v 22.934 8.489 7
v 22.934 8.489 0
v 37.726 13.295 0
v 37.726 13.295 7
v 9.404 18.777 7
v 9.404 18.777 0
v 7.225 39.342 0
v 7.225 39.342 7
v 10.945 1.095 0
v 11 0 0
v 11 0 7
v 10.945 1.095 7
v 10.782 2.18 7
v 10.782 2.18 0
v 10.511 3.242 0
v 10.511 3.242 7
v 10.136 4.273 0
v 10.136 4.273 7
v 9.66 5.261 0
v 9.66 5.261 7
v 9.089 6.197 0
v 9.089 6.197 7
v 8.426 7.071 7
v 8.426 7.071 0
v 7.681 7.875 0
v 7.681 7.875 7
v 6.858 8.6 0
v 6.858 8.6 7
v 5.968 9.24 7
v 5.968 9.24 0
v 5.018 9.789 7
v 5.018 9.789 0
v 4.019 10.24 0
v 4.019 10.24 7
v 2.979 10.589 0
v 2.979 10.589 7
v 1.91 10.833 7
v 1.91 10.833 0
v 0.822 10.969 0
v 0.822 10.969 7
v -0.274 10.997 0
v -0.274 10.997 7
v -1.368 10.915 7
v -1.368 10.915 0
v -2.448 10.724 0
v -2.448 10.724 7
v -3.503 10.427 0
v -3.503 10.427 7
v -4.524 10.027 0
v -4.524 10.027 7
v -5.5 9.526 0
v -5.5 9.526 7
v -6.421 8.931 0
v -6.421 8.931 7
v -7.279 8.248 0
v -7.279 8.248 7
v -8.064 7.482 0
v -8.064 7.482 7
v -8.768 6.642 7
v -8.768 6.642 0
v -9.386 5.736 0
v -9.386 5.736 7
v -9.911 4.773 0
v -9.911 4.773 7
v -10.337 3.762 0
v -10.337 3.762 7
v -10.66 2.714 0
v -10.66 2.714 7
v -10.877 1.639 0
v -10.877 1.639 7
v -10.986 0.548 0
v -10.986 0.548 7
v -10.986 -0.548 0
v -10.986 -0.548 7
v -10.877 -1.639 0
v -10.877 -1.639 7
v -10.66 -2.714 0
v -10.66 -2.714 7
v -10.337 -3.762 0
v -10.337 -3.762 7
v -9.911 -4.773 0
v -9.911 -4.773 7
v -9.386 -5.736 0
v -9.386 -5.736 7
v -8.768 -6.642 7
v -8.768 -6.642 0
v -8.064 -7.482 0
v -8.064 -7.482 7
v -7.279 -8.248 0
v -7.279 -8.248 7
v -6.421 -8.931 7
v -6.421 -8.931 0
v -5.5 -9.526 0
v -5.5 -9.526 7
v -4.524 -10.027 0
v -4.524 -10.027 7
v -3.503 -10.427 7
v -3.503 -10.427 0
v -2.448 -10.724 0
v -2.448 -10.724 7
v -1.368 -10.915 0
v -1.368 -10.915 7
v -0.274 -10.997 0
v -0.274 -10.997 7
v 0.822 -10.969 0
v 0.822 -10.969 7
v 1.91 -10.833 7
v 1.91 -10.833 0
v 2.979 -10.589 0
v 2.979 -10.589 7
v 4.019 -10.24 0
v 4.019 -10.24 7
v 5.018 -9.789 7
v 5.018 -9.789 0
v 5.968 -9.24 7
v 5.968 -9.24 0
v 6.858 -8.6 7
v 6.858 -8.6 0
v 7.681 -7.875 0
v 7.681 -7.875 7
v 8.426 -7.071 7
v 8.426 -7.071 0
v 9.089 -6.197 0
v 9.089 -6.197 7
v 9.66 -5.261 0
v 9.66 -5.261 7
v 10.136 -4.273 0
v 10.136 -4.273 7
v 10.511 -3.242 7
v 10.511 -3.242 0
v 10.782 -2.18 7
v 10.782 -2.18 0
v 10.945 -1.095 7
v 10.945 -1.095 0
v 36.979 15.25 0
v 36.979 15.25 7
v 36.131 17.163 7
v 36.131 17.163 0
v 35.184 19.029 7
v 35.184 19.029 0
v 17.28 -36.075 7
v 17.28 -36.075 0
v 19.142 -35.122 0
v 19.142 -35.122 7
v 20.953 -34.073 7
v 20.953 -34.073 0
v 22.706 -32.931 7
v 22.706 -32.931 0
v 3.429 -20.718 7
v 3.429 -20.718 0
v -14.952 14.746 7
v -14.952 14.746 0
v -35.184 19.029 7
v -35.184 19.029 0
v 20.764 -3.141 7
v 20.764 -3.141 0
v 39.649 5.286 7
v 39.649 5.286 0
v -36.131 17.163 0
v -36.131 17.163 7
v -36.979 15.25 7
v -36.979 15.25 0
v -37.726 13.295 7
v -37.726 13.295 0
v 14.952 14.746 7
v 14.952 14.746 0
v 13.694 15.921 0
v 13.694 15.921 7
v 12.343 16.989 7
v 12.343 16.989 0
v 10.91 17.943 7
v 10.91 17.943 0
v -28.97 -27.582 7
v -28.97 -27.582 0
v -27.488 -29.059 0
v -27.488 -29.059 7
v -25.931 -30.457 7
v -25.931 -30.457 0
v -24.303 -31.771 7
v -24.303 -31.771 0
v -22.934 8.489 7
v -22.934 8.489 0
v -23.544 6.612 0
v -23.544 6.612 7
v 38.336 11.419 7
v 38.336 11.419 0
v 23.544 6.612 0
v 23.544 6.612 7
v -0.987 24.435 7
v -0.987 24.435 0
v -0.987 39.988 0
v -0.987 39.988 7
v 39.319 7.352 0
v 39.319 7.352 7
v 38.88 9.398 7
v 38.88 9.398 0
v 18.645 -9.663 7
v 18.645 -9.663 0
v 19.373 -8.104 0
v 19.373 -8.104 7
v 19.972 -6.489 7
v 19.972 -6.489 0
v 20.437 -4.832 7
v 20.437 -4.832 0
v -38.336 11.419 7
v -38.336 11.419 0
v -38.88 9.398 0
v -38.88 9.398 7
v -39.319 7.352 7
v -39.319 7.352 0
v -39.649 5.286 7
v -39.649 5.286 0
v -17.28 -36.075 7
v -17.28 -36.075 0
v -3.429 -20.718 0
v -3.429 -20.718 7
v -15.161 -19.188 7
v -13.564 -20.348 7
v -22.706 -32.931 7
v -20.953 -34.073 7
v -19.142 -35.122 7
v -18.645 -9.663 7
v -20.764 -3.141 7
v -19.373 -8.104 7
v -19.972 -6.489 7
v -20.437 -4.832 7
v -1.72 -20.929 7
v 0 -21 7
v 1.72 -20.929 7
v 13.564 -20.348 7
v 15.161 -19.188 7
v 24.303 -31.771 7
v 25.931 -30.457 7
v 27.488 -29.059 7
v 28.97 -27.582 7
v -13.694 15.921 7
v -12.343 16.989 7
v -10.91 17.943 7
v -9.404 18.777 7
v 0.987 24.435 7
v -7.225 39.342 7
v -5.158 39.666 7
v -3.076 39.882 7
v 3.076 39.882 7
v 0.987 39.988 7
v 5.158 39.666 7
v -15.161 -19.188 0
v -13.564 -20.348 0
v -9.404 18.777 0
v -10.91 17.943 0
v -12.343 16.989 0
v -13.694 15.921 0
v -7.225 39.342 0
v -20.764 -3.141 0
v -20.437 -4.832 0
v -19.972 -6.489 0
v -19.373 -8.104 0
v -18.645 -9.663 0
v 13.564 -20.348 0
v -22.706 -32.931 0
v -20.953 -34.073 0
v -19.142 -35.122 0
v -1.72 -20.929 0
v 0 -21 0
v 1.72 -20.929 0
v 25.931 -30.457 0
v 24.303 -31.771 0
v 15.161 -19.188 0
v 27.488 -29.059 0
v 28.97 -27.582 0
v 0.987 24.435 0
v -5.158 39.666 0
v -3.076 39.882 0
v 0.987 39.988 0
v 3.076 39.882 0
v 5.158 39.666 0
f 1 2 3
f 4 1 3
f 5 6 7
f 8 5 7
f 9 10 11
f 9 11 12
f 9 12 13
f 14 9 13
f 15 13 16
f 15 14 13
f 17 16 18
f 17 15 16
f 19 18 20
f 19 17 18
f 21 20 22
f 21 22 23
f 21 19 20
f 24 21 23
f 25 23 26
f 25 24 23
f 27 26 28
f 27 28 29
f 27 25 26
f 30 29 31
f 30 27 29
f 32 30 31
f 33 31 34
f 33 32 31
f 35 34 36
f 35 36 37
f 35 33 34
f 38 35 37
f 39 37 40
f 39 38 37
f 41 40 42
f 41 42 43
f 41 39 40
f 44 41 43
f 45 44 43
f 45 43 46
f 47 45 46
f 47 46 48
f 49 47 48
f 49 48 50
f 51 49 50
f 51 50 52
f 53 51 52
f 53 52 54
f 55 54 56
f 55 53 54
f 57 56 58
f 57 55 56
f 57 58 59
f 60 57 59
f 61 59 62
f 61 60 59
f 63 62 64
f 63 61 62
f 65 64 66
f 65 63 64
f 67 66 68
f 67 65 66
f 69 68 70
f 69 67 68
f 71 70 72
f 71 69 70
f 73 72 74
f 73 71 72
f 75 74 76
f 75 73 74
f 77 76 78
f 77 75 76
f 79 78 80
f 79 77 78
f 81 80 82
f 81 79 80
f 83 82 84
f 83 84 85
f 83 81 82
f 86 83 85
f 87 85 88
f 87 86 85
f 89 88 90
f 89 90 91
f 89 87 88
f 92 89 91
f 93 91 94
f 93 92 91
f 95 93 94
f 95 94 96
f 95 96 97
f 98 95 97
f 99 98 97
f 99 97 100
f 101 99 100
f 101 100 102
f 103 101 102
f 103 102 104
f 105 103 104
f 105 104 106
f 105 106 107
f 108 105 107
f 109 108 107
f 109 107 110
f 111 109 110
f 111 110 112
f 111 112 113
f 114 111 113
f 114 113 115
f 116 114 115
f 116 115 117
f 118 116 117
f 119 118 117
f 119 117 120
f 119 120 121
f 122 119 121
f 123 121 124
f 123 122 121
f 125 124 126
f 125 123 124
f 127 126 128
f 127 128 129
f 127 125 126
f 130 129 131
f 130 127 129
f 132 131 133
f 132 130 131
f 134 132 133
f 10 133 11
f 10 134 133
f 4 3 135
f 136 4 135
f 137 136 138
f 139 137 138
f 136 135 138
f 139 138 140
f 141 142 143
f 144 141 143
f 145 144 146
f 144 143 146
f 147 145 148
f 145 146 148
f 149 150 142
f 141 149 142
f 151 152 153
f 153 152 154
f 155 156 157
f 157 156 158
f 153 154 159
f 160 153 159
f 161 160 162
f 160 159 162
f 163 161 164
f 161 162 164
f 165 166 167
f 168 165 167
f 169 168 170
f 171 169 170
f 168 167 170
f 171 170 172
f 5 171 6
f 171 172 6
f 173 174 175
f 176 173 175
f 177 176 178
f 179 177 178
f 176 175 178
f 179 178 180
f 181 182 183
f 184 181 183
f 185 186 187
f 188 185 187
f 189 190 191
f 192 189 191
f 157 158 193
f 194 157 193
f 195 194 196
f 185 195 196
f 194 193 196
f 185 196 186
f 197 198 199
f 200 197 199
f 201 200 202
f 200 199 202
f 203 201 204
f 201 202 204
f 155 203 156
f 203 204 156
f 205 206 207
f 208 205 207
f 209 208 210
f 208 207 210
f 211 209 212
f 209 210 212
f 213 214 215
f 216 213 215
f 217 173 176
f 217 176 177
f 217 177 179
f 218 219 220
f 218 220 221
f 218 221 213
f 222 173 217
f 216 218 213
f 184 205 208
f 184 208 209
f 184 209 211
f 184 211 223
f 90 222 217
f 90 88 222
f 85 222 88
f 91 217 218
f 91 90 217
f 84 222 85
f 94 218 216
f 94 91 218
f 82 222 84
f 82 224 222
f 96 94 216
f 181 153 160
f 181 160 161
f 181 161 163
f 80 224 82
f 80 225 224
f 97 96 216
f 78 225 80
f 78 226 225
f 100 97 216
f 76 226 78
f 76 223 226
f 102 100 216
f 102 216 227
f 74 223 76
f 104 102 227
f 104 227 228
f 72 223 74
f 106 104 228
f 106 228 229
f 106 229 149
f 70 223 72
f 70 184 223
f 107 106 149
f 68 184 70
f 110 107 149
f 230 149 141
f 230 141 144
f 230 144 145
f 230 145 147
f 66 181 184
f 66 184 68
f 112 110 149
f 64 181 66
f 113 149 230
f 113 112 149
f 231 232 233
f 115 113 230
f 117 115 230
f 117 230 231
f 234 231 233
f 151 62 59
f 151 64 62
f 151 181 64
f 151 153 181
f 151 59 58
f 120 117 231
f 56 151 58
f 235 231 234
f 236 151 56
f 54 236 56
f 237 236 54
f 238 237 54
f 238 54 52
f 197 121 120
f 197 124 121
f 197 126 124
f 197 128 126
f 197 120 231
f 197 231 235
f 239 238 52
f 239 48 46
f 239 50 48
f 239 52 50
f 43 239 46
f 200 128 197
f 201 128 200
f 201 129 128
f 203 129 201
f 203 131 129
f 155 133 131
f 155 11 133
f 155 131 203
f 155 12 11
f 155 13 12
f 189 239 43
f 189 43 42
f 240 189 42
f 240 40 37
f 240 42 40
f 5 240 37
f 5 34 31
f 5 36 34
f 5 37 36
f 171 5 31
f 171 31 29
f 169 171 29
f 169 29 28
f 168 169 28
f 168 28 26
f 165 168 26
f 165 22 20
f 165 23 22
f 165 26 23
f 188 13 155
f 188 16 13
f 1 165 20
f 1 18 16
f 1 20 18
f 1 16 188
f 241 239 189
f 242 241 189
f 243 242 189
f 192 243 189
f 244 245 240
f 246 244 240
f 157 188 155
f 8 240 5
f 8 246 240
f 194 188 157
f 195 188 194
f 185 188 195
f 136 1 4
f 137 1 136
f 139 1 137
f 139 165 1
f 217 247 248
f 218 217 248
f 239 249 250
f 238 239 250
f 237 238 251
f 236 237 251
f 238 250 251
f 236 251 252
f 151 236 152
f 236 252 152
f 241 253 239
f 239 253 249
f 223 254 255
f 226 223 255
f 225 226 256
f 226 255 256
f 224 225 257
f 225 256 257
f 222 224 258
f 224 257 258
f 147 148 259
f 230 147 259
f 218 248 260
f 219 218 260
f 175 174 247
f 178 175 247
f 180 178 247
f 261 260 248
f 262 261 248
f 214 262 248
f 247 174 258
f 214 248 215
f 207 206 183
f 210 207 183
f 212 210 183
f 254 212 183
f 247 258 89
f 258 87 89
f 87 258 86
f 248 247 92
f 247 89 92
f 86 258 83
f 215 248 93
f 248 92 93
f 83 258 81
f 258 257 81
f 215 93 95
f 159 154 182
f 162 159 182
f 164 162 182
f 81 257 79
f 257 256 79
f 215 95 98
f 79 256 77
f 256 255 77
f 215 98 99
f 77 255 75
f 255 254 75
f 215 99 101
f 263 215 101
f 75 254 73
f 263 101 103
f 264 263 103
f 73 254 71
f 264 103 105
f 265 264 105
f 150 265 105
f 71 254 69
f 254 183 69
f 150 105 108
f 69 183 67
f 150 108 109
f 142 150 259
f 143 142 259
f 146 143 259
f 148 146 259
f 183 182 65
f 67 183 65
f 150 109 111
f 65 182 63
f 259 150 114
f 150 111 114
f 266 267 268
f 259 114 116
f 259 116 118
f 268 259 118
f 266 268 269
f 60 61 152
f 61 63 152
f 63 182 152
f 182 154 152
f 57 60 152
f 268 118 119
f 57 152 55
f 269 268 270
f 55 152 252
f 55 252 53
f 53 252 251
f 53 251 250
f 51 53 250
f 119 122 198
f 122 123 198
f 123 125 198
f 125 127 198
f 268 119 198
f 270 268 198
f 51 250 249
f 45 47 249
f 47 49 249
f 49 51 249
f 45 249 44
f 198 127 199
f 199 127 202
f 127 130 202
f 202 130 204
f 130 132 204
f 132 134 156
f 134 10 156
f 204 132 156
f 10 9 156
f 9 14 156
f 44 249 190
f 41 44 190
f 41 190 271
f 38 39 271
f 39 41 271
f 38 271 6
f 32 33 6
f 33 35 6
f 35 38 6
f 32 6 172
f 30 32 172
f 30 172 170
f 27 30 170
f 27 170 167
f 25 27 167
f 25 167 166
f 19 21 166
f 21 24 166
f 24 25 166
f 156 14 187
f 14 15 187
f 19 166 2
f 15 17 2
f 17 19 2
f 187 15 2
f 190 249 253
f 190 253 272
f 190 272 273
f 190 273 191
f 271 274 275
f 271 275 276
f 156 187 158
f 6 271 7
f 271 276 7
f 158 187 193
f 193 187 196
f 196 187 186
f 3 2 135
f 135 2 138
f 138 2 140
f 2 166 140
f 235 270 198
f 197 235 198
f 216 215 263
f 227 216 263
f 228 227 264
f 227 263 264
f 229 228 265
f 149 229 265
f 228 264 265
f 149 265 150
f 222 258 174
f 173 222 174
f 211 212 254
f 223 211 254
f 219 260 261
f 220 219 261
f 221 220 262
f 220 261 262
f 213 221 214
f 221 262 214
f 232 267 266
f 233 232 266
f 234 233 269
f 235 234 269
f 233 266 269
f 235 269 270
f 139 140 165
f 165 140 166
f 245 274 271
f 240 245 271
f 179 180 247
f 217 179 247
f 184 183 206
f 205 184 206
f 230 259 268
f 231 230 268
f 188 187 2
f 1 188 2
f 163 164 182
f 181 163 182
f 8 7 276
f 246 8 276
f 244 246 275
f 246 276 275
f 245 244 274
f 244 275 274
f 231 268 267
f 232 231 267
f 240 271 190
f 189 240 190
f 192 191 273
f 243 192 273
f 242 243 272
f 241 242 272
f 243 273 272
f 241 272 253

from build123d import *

# Parameters (mm, degrees)
F0_R     = 11
F1_DEPTH = 7


with BuildPart() as f1:
    # F0 (on Top) → F1 (new body)
    with BuildSketch(Plane.XY):
        with BuildLine():
            ThreePointArc((9.403824, 18.776797), (0, 21), (-9.403824, 18.776797))
            ThreePointArc((-9.403824, 18.776797), (-12.34349, 16.989357), (-14.951853, 14.745918))
            ThreePointArc((-14.951853, 14.745918), (-19.972187, 6.489357), (-20.763736, -3.141219))
            ThreePointArc((-20.763736, -3.141219), (-19.972187, -6.489357), (-18.644578, -9.663318))
            ThreePointArc((-18.644578, -9.663318), (-12.34349, -16.989357), (-3.42887, -20.718177))
            ThreePointArc((-3.42887, -20.718177), (0, -21), (3.42887, -20.718177))
            ThreePointArc((3.42887, -20.718177), (12.34349, -16.989357), (18.644578, -9.663318))
            ThreePointArc((18.644578, -9.663318), (19.972187, -6.489357), (20.763736, -3.141219))
            ThreePointArc((20.763736, -3.141219), (20.940851, -1.575046), (21, 0))
            ThreePointArc((21, 0), (19.429217, 7.969036), (14.951853, 14.745918))
            ThreePointArc((14.951853, 14.745918), (12.34349, 16.989357), (9.403824, 18.776797))
        make_face()
        Circle(F0_R, mode=Mode.SUBTRACT)
        with BuildLine():
            Line((-0.986697, 24.434563), (-0.986697, 39.987829))
            ThreePointArc((-0.986697, 39.987829), (-4.11855, 39.787404), (-7.225052, 39.342072))
            Line((-7.225052, 39.342072), (-9.403824, 18.776797))
            ThreePointArc((-9.403824, 18.776797), (0, 21), (9.403824, 18.776797))
            Line((9.403824, 18.776797), (7.225052, 39.342072))
            ThreePointArc((7.225052, 39.342072), (4.11855, 39.787404), (0.986697, 39.987829))
            Line((0.986697, 39.987829), (0.986697, 24.434563))
            Line((0.986697, 24.434563), (-0.986697, 24.434563))
        make_face()
        with BuildLine():
            Line((35.18387, 19.028802), (14.951853, 14.745918))
            ThreePointArc((14.951853, 14.745918), (19.429217, 7.969036), (21, 0))
            ThreePointArc((21, 0), (20.940851, -1.575046), (20.763736, -3.141219))
            Line((20.763736, -3.141219), (39.649198, 5.285936))
            ThreePointArc((39.649198, 5.285936), (39.112772, 8.37801), (38.335591, 11.418514))
            Line((38.335591, 11.418514), (23.543556, 6.612291))
            Line((23.543556, 6.612291), (22.933744, 8.4891))
            Line((22.933744, 8.4891), (37.725779, 13.295323))
            ThreePointArc((37.725779, 13.295323), (36.567368, 16.211958), (35.18387, 19.028802))
        make_face()
        with BuildLine():
            Line((28.96988, -27.581626), (18.644578, -9.663318))
            ThreePointArc((18.644578, -9.663318), (12.34349, -16.989357), (3.42887, -20.718177))
            Line((3.42887, -20.718177), (17.2795, -36.075184))
            ThreePointArc((17.2795, -36.075184), (20.054472, -34.609509), (22.706001, -32.930799))
            Line((22.706001, -32.930799), (13.564021, -20.347942))
            Line((13.564021, -20.347942), (15.16053, -19.188011))
            Line((15.16053, -19.188011), (24.30251, -31.770867))
            ThreePointArc((24.30251, -31.770867), (26.718427, -29.767863), (28.96988, -27.581626))
        make_face()
        with BuildLine():
            ThreePointArc((-3.42887, -20.718177), (-12.34349, -16.989357), (-18.644578, -9.663318))
            Line((-18.644578, -9.663318), (-28.96988, -27.581626))
            ThreePointArc((-28.96988, -27.581626), (-26.718427, -29.767863), (-24.30251, -31.770867))
            Line((-24.30251, -31.770867), (-15.16053, -19.188011))
            Line((-15.16053, -19.188011), (-13.564021, -20.347942))
            Line((-13.564021, -20.347942), (-22.706001, -32.930799))
            ThreePointArc((-22.706001, -32.930799), (-20.054472, -34.609509), (-17.2795, -36.075184))
            Line((-17.2795, -36.075184), (-3.42887, -20.718177))
        make_face()
        with BuildLine():
            ThreePointArc((-20.763736, -3.141219), (-19.972187, 6.489357), (-14.951853, 14.745918))
            Line((-14.951853, 14.745918), (-35.18387, 19.028802))
            ThreePointArc((-35.18387, 19.028802), (-36.567368, 16.211958), (-37.725779, 13.295323))
            Line((-37.725779, 13.295323), (-22.933744, 8.4891))
            Line((-22.933744, 8.4891), (-23.543556, 6.612291))
            Line((-23.543556, 6.612291), (-38.335591, 11.418514))
            ThreePointArc((-38.335591, 11.418514), (-39.112772, 8.37801), (-39.649198, 5.285936))
            Line((-39.649198, 5.285936), (-20.763736, -3.141219))
        make_face()
    extrude(amount=F1_DEPTH)


solid = f1.part
